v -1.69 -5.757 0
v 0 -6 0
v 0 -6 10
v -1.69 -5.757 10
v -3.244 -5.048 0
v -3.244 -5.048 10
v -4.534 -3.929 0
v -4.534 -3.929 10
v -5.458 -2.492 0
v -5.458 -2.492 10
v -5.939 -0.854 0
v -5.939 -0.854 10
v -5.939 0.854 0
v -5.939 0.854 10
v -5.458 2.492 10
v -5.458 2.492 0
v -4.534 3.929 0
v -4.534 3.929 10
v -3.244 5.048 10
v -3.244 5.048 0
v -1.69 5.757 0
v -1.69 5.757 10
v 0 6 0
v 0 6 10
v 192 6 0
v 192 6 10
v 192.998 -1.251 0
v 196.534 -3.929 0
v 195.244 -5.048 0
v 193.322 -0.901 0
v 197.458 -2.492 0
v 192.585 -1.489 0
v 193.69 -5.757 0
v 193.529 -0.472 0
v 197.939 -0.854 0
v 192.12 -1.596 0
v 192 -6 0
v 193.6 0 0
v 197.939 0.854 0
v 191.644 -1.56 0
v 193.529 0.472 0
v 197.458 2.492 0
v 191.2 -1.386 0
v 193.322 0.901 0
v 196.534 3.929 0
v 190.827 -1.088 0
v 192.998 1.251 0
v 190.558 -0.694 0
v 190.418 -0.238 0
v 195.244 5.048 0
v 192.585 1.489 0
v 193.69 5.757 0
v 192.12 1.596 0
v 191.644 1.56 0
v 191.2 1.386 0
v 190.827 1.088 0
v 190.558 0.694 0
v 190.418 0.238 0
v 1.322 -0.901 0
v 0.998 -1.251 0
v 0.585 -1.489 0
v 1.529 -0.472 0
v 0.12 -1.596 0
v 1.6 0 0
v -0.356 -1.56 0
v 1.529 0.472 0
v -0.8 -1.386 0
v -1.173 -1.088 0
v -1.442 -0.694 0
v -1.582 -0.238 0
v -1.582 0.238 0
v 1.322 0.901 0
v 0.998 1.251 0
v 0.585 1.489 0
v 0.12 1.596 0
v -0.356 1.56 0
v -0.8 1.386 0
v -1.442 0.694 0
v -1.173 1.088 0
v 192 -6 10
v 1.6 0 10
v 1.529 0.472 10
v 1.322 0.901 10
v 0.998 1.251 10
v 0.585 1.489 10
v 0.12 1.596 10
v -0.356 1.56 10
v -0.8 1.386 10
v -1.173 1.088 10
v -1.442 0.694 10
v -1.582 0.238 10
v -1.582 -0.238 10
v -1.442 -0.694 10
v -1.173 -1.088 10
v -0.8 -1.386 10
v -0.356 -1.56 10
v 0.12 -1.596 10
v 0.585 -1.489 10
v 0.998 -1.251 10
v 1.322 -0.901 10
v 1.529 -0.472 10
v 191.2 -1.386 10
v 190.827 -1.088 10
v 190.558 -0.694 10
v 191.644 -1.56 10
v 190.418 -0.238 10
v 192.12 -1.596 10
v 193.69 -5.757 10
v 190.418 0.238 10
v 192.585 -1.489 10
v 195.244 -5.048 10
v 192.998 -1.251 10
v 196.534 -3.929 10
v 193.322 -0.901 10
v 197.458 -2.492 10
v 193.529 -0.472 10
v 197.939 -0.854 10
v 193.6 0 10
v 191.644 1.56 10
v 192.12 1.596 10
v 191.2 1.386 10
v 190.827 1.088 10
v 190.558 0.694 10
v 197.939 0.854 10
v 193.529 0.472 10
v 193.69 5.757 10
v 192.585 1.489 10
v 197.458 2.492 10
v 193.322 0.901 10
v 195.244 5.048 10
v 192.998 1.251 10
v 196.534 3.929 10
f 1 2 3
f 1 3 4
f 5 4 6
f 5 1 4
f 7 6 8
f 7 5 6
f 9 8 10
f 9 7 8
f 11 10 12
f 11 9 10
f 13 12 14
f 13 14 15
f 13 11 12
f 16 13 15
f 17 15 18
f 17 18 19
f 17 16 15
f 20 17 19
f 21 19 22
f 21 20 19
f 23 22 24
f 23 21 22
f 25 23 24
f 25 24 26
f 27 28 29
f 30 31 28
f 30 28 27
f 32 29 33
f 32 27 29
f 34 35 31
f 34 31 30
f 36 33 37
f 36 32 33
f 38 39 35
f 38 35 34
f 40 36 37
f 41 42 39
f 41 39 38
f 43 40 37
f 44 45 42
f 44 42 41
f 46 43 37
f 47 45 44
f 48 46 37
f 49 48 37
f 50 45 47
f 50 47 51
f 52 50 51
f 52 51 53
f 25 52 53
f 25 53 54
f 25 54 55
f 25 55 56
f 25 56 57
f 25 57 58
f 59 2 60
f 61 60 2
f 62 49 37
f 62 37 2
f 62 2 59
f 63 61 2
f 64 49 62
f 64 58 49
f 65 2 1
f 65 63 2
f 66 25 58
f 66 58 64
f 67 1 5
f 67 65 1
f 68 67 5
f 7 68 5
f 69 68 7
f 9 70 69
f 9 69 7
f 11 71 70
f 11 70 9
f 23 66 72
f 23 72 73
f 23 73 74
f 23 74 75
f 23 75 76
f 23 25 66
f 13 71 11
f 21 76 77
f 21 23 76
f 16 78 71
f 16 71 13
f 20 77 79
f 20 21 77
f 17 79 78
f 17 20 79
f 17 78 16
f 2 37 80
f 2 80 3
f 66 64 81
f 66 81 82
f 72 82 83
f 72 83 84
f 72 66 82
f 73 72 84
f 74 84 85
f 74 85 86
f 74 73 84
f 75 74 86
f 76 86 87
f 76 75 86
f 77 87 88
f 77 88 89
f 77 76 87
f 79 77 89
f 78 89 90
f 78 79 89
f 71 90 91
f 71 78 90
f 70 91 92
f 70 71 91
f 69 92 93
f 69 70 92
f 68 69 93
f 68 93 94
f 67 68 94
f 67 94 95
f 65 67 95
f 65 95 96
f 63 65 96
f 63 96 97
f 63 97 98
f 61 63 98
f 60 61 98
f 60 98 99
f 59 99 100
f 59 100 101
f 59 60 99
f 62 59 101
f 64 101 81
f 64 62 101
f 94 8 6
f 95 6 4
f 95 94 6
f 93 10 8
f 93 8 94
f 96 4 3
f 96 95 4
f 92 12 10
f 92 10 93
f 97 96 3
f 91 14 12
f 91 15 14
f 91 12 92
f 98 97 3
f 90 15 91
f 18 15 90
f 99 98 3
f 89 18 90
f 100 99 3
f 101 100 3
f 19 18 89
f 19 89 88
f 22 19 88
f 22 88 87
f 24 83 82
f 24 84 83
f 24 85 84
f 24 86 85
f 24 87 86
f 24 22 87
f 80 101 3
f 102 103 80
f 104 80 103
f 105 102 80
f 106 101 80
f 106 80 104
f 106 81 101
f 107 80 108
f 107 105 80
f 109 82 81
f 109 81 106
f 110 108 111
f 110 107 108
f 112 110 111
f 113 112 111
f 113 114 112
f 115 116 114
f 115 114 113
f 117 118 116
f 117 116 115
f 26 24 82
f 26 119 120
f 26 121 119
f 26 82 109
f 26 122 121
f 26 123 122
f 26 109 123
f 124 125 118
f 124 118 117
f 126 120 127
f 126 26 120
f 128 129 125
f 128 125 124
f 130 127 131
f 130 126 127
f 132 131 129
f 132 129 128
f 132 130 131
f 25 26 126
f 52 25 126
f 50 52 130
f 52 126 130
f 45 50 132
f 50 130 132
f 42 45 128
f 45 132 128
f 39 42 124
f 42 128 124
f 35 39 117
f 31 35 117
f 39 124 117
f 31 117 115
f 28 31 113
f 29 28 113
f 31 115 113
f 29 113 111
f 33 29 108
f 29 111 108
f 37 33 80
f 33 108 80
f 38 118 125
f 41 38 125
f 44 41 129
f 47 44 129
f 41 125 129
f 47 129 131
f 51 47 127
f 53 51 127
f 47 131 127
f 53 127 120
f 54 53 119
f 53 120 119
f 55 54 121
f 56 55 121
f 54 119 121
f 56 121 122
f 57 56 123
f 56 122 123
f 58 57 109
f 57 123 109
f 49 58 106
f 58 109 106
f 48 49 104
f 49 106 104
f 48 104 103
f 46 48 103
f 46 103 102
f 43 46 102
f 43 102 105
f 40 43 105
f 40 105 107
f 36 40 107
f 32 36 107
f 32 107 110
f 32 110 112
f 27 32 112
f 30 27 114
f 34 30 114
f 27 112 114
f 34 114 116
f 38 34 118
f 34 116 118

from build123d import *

# Parameters (mm, degrees)
SKETCH1_R           = 1.6
BOSS_EXTRUDE1_DEPTH = 10
SKETCH2_R           = 1.6
CUT_EXTRUDE1_DEPTH  = 10
SKETCH3_R           = 1.6
BOSS_EXTRUDE2_DEPTH = 10


with BuildPart() as part:
    # Sketch1 → Boss-Extrude1 (new body)
    with BuildSketch(Plane.XY):
        with BuildLine():
            Line((0, 6), (196, 6))
            ThreePointArc((196, 6), (202, 0), (196, -6))
            Line((196, -6), (0, -6))
            ThreePointArc((0, -6), (-6, 0), (0, 6))
        make_face()
        Circle(SKETCH1_R, mode=Mode.SUBTRACT)
        with Locations((196, 0)):
            Circle(SKETCH1_R, mode=Mode.SUBTRACT)
    extrude(amount=BOSS_EXTRUDE1_DEPTH)

    # Sketch2 → Cut-Extrude1 (cut)
    with BuildSketch(Plane.XY.offset(10)):
        with Locations((192, 0)):
            Circle(SKETCH2_R)
        with BuildLine():
            Line((196, 6), (192, 6))
            ThreePointArc((192, 6), (198, 0), (192, -6))
            Line((192, -6), (196, -6))
            ThreePointArc((196, -6), (202, 0), (196, 6))
        make_face()
    extrude(amount=-CUT_EXTRUDE1_DEPTH, mode=Mode.SUBTRACT)

    # Sketch3 → Boss-Extrude2 (add)
    with BuildSketch(Plane.XY.offset(10)):
        with Locations((196, 0)):
            Circle(SKETCH3_R)
    extrude(amount=-BOSS_EXTRUDE2_DEPTH)


solid = part.part
